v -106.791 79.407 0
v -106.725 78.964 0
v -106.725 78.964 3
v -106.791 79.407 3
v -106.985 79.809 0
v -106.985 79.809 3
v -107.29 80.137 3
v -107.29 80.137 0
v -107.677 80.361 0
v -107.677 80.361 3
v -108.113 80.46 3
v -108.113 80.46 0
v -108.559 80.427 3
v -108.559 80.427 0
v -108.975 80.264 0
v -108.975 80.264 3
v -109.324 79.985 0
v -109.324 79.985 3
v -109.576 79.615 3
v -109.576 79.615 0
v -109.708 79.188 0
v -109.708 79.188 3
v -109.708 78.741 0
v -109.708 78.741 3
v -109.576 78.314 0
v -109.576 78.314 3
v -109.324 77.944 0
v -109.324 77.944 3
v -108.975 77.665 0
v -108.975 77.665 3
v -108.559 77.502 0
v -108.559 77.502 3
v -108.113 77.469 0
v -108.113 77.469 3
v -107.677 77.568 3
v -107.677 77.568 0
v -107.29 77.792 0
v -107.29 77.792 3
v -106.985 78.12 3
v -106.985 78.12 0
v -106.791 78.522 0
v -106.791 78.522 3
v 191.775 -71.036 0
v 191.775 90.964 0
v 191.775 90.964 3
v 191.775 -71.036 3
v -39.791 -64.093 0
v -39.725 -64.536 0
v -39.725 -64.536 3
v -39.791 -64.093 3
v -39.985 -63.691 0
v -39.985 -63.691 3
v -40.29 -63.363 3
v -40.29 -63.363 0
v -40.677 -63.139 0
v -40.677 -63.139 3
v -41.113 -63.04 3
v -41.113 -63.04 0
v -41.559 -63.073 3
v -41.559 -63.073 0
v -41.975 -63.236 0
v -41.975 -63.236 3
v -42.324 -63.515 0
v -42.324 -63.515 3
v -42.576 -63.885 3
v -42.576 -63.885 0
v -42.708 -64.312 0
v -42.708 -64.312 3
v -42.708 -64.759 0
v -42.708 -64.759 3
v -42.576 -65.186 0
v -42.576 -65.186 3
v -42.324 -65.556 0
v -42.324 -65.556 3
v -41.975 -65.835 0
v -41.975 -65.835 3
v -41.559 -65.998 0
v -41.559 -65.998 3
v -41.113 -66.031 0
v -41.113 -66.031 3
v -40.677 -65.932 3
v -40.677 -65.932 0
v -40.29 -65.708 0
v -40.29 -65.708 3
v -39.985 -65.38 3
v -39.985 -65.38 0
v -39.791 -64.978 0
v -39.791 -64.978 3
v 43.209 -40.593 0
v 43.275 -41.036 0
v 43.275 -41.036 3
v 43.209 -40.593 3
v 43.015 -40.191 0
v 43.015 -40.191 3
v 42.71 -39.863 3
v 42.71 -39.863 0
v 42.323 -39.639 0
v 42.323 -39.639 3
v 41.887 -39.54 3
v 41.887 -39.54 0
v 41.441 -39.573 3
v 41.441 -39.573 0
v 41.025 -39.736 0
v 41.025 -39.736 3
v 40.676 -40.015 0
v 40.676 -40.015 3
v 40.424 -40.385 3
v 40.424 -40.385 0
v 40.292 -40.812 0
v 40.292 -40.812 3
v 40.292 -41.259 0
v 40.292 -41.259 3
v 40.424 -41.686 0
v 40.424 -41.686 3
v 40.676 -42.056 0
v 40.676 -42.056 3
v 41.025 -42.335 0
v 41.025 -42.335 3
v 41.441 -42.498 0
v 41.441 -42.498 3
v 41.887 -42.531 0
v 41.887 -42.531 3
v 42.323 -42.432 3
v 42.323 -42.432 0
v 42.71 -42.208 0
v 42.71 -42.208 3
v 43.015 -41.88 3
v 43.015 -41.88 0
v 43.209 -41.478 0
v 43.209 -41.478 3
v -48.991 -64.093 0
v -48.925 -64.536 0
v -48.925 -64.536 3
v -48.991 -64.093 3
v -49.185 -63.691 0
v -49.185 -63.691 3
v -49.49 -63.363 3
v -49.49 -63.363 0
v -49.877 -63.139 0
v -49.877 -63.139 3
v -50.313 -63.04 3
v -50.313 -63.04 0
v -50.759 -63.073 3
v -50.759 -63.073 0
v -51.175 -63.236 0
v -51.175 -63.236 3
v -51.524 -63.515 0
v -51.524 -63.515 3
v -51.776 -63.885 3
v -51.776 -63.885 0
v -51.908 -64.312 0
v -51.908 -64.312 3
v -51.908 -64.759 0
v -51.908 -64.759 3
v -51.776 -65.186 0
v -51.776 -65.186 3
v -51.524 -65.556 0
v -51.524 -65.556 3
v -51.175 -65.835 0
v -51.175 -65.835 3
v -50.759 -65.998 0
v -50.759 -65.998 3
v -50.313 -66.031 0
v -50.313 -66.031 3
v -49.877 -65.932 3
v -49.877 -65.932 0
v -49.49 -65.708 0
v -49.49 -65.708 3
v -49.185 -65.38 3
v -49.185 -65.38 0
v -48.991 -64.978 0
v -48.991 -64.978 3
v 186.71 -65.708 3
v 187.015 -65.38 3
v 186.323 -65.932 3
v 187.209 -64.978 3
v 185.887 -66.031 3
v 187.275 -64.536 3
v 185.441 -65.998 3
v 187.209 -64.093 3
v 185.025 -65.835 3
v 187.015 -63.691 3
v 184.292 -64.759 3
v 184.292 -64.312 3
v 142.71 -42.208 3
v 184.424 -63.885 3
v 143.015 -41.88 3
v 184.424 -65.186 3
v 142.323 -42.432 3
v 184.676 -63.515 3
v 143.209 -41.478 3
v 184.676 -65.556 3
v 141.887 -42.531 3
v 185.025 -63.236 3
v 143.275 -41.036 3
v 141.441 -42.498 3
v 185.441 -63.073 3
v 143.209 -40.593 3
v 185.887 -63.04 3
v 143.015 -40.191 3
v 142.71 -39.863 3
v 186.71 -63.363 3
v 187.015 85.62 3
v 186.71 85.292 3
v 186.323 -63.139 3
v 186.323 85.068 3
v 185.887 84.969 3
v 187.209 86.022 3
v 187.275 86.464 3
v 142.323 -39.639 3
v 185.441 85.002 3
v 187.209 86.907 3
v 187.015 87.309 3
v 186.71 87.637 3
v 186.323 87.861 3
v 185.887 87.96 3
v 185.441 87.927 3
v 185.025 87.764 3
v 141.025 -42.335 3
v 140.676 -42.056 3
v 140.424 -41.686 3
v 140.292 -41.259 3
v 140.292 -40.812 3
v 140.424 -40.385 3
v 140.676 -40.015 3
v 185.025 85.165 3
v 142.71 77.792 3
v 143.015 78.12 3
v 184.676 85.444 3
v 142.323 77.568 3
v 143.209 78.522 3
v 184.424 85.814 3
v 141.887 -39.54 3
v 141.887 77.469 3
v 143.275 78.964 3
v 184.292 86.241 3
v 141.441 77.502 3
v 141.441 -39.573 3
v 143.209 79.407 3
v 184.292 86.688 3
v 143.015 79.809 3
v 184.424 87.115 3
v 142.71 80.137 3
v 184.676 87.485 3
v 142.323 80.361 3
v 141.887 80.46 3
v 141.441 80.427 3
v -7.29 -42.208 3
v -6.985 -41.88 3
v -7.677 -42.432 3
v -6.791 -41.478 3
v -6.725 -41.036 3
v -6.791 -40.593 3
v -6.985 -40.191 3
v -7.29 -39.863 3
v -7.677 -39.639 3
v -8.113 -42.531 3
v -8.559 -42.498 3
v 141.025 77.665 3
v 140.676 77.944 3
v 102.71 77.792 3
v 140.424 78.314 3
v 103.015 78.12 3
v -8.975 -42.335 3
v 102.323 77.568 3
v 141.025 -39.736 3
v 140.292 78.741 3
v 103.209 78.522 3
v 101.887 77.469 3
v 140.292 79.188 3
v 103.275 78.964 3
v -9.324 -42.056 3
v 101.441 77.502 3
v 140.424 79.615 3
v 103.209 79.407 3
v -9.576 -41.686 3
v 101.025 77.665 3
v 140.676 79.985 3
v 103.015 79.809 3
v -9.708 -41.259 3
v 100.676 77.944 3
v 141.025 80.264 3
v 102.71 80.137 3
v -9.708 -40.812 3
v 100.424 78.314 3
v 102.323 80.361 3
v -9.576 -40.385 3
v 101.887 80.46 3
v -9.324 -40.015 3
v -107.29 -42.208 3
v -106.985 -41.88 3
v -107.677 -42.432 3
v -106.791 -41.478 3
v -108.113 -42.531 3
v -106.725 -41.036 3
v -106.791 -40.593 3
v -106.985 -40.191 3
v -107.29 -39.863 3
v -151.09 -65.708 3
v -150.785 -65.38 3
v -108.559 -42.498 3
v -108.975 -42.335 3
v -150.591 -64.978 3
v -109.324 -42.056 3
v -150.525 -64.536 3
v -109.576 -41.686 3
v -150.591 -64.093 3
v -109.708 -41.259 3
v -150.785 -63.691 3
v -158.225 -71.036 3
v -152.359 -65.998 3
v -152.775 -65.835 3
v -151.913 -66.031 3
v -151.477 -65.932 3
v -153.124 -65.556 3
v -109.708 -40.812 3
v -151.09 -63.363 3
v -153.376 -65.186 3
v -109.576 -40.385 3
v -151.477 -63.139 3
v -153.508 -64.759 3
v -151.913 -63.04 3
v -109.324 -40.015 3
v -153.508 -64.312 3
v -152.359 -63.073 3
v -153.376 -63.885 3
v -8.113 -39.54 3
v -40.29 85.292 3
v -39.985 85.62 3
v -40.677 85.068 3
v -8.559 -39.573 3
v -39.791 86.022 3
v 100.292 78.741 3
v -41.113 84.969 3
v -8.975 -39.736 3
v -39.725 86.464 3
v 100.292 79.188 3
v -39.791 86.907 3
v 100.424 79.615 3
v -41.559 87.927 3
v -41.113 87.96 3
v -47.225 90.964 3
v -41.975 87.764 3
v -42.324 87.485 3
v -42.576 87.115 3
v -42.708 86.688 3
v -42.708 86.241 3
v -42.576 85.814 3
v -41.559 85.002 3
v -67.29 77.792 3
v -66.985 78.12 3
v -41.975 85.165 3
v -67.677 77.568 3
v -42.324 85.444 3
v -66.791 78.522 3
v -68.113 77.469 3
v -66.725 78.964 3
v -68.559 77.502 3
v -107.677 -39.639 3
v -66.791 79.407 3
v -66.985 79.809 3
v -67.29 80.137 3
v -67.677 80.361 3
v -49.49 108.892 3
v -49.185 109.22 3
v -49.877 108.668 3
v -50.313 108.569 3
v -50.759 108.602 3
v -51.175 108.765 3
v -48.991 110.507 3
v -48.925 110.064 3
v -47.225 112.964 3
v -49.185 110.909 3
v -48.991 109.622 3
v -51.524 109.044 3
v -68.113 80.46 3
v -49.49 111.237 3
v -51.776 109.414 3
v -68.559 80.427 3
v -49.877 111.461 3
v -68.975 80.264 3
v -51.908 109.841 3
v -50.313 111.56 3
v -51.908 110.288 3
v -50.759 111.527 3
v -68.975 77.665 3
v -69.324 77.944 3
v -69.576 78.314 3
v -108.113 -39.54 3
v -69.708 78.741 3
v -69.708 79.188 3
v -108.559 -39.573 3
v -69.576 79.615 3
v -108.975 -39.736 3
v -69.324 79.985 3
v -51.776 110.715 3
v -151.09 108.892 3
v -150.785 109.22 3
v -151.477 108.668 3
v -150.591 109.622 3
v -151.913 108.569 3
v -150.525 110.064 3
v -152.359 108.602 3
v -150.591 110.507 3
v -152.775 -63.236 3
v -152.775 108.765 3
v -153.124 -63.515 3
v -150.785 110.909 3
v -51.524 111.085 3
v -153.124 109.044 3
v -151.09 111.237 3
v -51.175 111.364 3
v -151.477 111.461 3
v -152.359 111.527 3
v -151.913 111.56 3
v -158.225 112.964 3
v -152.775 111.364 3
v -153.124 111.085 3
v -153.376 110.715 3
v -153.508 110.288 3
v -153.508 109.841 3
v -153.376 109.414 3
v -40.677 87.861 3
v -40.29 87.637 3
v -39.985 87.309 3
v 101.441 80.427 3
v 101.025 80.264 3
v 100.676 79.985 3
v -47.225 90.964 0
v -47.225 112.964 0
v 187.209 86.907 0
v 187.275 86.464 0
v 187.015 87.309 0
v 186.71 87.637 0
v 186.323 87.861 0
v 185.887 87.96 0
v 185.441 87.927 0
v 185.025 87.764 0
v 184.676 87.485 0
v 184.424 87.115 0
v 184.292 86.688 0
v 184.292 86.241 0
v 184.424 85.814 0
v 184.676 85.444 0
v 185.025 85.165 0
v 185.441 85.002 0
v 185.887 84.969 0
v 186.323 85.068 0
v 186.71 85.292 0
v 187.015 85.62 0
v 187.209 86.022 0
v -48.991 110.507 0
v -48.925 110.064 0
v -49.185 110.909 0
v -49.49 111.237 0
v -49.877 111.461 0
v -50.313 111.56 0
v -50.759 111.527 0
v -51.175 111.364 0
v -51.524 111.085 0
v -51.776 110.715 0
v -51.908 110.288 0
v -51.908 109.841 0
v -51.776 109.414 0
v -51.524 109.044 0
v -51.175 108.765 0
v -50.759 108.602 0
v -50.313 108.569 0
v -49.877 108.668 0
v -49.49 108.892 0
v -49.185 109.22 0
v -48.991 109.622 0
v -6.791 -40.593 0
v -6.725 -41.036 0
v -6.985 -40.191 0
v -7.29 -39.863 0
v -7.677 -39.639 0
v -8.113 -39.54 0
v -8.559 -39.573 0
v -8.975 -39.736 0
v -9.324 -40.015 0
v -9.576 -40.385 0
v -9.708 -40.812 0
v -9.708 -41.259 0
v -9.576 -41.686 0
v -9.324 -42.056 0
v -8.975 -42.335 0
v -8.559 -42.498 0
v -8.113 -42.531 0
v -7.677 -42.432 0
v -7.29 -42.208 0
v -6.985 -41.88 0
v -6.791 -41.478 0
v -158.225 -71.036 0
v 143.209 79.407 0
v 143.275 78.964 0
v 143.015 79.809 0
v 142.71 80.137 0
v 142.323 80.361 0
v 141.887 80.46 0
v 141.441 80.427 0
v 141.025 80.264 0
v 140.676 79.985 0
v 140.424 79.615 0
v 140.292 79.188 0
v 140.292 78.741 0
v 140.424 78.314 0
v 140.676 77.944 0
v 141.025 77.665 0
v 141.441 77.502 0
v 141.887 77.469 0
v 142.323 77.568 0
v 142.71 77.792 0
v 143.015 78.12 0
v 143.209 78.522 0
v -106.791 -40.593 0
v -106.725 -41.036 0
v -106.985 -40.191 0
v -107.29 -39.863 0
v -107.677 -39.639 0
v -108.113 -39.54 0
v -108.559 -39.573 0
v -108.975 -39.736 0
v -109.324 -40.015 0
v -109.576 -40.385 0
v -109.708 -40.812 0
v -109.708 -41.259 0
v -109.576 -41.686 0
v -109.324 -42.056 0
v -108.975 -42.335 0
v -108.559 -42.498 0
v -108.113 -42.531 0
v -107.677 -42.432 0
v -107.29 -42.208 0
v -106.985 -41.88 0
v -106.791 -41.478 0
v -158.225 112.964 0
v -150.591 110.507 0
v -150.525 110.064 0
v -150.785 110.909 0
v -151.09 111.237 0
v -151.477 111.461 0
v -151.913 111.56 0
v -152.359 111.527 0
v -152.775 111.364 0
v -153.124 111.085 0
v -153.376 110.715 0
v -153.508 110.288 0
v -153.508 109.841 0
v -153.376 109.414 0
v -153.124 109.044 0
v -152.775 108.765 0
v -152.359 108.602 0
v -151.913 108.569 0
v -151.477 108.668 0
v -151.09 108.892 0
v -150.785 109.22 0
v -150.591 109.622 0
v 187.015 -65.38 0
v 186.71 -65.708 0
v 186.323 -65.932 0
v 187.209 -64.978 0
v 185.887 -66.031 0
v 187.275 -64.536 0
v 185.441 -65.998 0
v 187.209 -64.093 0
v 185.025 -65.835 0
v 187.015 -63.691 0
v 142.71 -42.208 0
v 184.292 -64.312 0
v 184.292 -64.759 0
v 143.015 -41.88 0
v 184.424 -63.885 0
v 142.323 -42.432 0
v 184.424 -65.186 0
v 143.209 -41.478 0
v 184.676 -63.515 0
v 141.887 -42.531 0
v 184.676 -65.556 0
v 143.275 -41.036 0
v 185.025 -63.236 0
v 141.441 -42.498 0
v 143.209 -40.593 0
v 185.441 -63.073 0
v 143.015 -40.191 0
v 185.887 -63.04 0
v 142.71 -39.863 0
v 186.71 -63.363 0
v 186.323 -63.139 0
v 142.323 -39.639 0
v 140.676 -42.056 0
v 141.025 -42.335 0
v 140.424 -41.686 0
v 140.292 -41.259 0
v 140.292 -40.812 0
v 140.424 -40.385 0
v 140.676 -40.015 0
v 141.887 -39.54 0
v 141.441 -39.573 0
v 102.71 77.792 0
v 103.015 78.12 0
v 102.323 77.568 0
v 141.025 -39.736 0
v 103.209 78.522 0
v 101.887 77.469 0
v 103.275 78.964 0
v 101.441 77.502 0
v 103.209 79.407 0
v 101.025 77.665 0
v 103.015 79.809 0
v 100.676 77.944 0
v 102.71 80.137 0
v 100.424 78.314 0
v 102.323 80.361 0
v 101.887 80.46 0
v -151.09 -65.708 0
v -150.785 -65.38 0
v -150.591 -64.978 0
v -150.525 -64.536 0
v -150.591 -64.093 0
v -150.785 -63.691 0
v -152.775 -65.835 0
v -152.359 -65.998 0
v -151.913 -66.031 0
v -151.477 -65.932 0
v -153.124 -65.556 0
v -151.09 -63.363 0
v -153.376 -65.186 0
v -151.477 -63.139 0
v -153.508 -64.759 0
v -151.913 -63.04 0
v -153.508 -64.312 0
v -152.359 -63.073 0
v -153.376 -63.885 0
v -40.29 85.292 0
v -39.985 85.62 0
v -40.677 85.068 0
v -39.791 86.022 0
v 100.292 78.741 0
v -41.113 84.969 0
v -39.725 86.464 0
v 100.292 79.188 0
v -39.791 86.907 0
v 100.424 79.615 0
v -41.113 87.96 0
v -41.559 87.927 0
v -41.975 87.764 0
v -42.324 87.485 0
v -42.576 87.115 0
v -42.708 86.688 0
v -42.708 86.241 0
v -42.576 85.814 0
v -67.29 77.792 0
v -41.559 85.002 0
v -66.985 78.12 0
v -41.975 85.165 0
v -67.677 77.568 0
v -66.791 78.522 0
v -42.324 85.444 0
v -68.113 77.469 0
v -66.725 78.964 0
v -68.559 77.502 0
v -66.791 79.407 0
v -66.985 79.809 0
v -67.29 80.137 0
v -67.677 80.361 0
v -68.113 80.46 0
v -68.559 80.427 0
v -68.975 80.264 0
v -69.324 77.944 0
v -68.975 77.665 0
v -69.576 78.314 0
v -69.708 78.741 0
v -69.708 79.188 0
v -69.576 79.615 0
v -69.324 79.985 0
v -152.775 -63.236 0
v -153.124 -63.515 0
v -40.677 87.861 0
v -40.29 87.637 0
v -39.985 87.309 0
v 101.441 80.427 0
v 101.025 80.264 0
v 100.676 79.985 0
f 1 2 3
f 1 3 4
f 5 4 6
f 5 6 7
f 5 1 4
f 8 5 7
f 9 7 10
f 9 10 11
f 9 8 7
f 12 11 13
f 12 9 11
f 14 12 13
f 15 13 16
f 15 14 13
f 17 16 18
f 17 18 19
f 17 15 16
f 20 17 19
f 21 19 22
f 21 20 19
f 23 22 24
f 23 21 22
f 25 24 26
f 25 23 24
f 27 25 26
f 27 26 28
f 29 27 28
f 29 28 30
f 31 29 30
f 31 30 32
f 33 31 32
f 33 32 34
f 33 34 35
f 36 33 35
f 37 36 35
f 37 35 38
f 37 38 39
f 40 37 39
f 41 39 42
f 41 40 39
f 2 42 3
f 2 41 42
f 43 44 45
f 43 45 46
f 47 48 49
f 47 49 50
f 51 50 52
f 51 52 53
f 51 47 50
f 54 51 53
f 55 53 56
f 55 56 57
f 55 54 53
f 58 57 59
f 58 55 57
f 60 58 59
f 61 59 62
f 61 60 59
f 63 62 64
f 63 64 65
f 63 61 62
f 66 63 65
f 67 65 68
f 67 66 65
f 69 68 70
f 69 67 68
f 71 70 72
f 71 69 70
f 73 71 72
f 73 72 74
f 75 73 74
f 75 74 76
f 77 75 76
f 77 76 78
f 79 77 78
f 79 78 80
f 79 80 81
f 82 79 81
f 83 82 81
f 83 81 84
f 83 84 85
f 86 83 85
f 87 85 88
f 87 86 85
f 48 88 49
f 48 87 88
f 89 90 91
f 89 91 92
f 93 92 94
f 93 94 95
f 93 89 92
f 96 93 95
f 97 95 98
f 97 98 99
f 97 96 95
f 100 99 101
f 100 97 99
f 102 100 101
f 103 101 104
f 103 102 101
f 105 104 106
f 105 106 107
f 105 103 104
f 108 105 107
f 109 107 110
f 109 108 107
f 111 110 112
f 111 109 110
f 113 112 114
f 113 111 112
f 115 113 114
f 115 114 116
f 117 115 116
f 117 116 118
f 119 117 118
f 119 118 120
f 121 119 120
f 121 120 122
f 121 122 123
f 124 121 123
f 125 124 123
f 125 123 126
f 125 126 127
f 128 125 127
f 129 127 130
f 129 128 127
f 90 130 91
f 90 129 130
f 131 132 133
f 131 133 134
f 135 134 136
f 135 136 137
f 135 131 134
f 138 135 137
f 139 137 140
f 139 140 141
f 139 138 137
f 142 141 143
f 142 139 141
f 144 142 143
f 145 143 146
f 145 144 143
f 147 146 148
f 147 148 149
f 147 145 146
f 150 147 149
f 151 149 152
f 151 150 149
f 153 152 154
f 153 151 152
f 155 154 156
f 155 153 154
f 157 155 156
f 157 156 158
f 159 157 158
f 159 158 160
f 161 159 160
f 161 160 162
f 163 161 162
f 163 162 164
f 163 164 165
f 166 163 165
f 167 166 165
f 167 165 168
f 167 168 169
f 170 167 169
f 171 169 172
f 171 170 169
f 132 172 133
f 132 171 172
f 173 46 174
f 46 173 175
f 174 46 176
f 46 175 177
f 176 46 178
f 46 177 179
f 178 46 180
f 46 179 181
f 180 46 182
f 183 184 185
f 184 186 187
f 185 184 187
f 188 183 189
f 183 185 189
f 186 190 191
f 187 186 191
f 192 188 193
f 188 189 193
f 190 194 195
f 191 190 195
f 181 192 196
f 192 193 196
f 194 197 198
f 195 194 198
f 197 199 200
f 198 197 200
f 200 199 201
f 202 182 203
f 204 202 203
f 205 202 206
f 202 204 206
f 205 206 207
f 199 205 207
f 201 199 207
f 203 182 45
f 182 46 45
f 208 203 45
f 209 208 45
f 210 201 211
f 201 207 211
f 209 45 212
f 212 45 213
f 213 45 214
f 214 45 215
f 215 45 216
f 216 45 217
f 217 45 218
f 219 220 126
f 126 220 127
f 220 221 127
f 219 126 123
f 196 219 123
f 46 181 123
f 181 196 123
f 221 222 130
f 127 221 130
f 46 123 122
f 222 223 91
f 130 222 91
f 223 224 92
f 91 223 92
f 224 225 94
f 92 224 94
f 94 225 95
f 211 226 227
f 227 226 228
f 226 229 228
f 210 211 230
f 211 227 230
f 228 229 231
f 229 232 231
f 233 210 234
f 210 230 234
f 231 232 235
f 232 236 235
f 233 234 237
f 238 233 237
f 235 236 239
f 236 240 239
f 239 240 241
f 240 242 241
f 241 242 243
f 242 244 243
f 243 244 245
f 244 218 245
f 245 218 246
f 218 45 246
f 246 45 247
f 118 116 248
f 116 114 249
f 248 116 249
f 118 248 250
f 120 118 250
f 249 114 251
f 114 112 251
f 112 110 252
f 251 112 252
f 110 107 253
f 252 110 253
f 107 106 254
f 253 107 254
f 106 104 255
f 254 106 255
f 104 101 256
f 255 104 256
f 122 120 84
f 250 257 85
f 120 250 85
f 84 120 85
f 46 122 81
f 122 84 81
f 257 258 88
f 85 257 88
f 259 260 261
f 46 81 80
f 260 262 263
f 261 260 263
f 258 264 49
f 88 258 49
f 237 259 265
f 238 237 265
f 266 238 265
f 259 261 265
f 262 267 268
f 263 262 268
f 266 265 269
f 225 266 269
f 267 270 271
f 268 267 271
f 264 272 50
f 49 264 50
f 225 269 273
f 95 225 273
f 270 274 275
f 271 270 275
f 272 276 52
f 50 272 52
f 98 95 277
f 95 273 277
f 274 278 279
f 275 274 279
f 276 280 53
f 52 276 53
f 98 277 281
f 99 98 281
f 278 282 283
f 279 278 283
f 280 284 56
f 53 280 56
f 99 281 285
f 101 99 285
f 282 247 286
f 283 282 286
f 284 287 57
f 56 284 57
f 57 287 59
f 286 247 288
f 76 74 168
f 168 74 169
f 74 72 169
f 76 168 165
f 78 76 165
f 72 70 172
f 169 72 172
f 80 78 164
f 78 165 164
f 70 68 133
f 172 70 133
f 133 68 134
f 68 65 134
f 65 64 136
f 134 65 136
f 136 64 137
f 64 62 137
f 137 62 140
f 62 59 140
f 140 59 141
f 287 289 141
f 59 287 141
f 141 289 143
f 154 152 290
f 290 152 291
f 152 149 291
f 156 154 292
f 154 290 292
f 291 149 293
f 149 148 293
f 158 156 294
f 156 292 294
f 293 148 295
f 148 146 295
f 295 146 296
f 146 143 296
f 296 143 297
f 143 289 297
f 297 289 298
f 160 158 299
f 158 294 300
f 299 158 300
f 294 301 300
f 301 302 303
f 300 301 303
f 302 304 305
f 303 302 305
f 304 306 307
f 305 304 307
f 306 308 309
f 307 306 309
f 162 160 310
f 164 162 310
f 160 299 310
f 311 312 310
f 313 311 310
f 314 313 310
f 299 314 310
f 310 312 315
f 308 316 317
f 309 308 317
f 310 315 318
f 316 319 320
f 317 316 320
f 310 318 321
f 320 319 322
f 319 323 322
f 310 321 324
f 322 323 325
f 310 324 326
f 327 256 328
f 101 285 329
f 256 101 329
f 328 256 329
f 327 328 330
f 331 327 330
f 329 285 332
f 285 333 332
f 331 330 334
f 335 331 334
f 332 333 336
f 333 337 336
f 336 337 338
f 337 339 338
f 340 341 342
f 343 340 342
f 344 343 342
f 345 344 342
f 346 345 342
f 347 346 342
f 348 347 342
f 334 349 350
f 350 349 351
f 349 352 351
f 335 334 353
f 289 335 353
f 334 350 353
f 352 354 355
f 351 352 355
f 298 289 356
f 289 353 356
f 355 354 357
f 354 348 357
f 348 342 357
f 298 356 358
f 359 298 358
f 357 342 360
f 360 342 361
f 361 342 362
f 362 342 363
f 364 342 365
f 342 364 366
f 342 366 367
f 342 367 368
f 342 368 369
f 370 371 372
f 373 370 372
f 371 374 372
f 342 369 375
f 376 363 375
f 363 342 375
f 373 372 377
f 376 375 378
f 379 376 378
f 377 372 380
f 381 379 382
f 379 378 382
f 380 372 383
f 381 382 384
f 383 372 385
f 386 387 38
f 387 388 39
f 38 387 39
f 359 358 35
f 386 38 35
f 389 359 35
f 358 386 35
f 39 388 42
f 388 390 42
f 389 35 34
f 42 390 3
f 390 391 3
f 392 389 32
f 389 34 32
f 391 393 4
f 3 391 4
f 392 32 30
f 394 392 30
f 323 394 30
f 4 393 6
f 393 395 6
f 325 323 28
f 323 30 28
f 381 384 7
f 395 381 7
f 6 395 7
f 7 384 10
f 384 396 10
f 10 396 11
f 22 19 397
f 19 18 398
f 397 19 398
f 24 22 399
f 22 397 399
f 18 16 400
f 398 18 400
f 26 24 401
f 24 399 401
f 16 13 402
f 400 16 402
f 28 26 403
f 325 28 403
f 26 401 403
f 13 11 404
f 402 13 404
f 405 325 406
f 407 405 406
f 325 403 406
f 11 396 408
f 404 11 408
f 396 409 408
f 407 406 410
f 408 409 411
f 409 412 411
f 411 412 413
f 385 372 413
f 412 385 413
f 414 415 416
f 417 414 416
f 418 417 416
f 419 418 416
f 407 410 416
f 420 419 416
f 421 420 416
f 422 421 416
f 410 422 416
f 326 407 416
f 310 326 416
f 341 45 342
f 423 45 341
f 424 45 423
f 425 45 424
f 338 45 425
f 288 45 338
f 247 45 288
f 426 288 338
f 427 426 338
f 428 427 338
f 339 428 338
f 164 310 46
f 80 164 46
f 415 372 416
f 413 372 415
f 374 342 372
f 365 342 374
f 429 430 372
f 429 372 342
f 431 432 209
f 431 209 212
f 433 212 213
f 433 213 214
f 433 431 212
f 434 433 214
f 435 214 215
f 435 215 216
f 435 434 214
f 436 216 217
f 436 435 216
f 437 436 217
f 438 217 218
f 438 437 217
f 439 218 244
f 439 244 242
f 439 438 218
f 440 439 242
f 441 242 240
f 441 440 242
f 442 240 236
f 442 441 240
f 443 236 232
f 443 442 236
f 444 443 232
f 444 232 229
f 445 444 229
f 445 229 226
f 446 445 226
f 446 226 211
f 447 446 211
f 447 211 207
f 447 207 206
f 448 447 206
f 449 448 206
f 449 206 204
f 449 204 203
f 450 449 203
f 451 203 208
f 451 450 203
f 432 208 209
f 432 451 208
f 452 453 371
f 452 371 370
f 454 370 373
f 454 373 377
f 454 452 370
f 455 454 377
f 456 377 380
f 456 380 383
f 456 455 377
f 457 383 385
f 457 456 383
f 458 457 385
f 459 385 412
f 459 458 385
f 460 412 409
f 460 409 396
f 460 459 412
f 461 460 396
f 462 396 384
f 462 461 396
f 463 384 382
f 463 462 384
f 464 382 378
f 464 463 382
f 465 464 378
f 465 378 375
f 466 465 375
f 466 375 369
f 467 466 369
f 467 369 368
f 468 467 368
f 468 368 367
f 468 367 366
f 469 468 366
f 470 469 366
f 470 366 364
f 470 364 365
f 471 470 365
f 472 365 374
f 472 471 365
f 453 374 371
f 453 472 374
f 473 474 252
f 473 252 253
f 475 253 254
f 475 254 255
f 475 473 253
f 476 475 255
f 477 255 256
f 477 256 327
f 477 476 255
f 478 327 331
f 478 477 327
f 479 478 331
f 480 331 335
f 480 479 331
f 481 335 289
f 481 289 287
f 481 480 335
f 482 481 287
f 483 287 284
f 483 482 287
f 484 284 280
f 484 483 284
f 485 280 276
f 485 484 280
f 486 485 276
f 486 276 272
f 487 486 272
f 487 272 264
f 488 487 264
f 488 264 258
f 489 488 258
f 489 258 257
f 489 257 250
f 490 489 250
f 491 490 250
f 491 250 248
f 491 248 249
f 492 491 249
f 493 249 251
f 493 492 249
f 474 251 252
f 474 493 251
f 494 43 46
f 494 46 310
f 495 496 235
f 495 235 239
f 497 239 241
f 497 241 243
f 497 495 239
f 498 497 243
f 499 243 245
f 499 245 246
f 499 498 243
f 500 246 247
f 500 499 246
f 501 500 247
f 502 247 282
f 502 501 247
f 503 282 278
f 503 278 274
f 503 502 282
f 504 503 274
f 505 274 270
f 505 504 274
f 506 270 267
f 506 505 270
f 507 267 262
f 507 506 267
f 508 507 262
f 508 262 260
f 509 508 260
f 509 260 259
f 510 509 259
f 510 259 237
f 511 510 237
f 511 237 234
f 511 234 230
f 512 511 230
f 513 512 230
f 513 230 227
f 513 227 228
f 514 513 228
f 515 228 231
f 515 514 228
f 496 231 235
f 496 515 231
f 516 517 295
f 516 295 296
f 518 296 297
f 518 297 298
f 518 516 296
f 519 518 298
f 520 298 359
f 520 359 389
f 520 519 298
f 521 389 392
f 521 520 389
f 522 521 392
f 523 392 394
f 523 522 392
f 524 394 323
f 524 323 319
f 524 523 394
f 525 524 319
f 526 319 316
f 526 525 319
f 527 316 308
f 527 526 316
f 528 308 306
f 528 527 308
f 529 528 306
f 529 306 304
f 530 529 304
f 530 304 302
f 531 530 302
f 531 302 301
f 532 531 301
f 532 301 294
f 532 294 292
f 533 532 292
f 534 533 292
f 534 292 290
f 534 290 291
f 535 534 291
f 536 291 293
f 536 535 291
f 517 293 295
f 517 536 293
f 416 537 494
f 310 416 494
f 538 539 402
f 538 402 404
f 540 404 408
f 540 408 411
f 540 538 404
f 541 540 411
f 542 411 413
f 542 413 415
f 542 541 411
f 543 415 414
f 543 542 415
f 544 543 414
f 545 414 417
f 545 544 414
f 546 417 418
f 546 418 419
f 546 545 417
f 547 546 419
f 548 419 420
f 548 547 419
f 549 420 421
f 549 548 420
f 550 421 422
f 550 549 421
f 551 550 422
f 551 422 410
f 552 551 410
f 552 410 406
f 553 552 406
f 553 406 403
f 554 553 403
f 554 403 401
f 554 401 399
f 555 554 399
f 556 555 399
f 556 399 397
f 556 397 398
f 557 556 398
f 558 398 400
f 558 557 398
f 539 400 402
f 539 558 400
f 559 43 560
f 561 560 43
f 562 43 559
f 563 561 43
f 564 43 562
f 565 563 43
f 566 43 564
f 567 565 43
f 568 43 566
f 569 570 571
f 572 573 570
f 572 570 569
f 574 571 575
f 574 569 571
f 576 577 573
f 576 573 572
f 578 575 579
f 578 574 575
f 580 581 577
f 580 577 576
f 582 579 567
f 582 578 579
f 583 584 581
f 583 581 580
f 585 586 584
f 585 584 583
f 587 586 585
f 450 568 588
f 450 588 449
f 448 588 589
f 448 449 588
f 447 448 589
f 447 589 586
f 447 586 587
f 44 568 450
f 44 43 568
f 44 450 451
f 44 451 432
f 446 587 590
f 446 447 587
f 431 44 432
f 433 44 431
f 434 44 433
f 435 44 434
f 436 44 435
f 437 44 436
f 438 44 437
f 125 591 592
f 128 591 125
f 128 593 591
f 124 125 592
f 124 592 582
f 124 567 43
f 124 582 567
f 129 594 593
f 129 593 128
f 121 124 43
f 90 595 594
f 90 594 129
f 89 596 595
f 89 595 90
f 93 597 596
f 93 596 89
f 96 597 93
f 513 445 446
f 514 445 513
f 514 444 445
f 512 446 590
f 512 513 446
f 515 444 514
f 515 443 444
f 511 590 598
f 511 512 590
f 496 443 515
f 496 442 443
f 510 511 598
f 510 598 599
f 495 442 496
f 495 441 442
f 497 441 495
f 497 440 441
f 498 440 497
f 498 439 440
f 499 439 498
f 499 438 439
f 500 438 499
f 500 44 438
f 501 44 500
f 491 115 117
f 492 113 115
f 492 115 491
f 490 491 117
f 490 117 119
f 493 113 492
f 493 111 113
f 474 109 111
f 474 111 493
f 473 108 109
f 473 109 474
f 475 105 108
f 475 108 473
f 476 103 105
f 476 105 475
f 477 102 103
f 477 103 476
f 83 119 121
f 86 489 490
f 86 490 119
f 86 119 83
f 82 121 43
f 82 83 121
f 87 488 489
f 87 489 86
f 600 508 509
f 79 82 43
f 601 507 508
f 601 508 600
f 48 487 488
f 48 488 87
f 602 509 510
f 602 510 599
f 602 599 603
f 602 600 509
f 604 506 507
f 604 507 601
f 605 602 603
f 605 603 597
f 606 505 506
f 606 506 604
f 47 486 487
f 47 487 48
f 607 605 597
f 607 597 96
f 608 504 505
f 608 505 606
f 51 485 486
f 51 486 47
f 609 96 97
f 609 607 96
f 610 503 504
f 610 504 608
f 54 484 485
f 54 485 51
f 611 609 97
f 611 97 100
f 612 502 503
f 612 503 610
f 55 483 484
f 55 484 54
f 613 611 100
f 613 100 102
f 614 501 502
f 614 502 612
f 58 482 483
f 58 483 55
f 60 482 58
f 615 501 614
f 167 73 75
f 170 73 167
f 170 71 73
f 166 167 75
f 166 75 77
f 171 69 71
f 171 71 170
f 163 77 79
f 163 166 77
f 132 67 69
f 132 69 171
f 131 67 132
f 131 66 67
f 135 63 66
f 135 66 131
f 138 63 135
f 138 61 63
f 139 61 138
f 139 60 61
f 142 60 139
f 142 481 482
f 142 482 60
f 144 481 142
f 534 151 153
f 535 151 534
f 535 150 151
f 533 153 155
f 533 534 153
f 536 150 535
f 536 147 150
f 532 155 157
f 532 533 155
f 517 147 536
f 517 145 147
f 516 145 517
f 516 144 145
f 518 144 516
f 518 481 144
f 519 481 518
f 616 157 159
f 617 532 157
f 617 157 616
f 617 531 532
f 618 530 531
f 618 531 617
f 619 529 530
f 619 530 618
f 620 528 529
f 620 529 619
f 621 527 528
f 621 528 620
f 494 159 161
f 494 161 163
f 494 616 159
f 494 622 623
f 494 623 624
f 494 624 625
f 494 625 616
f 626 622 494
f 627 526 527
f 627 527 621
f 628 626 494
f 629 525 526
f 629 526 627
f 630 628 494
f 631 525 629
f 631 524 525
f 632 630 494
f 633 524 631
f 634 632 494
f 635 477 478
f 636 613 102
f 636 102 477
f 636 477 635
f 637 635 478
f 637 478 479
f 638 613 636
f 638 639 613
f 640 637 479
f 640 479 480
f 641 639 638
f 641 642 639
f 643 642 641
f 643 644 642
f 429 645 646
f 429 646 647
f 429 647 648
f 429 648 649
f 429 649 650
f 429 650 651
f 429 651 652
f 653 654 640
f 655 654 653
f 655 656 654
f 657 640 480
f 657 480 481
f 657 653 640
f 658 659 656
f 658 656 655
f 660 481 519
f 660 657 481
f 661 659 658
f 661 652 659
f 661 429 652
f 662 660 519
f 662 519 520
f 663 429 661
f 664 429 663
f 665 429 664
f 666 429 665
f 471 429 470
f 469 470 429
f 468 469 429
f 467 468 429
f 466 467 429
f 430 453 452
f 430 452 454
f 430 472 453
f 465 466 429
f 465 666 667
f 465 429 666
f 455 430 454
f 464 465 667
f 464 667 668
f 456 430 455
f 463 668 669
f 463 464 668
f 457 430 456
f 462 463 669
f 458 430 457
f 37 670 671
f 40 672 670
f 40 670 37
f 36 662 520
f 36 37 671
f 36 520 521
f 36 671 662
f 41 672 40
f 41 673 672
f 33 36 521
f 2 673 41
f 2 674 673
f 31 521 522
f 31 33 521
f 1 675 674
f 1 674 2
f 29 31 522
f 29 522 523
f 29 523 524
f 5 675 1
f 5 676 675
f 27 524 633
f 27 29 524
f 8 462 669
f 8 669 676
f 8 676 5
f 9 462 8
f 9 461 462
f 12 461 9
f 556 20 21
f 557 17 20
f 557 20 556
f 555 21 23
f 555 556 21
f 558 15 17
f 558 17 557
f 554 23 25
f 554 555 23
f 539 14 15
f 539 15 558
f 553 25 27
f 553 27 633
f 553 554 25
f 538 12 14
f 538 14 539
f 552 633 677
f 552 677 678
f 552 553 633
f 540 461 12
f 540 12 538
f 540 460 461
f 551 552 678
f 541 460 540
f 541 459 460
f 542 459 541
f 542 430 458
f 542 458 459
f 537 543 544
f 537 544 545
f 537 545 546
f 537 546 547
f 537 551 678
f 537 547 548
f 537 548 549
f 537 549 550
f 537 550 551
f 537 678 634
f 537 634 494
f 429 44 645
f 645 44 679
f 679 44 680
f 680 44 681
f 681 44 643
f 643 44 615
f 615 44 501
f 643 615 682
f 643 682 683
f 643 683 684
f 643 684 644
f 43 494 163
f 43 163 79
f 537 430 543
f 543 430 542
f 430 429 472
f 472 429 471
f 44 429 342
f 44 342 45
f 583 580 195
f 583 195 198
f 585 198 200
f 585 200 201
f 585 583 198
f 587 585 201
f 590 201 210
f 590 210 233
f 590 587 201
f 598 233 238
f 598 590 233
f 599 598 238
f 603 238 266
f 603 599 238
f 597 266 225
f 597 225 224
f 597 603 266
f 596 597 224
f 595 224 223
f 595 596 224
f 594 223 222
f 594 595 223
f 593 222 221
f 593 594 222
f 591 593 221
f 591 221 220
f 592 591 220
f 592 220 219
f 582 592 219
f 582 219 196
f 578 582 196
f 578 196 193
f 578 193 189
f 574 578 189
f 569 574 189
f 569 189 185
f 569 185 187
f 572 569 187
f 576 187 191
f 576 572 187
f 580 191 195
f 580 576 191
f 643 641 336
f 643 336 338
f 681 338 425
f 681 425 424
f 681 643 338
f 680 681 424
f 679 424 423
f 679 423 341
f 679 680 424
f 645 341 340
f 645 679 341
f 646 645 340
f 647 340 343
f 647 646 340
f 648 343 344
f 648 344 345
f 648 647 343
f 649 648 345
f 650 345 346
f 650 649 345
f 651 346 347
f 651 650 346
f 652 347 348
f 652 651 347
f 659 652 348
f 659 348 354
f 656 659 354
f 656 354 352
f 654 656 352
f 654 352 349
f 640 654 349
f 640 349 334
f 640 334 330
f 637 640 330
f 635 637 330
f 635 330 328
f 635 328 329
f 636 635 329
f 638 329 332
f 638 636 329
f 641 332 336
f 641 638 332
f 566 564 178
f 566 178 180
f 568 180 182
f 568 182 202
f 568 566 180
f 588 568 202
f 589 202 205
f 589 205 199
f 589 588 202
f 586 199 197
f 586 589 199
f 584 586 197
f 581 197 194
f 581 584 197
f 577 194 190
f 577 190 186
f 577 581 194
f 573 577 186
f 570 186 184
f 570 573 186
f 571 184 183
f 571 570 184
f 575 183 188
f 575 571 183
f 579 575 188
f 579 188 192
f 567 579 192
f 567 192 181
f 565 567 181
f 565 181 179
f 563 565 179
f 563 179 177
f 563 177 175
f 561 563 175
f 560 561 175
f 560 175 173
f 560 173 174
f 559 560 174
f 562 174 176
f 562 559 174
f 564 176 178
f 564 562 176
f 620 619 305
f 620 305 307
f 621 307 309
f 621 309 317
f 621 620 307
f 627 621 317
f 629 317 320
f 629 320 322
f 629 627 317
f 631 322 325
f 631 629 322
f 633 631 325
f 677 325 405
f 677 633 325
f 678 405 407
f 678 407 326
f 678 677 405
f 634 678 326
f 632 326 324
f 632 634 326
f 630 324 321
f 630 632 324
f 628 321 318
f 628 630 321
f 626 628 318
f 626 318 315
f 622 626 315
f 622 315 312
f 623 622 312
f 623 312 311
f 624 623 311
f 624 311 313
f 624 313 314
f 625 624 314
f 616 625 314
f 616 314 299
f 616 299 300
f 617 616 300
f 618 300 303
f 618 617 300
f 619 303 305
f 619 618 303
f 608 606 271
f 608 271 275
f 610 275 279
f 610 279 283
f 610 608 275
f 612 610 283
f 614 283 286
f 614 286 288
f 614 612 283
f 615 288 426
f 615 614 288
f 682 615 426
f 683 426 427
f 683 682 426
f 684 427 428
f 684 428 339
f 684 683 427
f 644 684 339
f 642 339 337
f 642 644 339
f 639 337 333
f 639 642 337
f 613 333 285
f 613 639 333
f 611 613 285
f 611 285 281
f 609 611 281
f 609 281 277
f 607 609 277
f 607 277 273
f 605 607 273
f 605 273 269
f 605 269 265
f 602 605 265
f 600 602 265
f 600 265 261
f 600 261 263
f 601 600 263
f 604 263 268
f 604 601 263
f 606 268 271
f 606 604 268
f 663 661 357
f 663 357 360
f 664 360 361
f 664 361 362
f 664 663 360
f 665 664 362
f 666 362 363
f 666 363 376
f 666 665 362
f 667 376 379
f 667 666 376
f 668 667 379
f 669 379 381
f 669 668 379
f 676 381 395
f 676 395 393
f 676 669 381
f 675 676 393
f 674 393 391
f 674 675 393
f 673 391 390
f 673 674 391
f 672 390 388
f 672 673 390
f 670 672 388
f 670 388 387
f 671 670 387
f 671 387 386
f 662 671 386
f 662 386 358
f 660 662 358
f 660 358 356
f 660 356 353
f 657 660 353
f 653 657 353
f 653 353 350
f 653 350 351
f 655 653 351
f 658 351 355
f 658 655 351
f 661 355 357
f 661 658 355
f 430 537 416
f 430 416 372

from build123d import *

# Parameters (mm, degrees)
SKETCH_1_R      = 1.5
EXTRUDE_1_DEPTH = 3


with BuildPart() as part:
    # 스케치1 → 보스-돌출1 (new body)
    with BuildSketch(Plane.XY):
        Polygon((-47.224852071, 90.964497041), (191.775147929, 90.964497041), (191.775147929, -71.035502959), (-158.224852071, -71.035502959), (-158.224852071, 90.964497041), (-158.224852071, 112.964497041), (-47.224852071, 112.964497041), align=None)
        with Locations((-108.224852071, 78.964497041)):
            Circle(SKETCH_1_R, mode=Mode.SUBTRACT)
        with Locations((-68.224852071, 78.964497041)):
            Circle(SKETCH_1_R, mode=Mode.SUBTRACT)
        with Locations((101.775147929, 78.964497041)):
            Circle(SKETCH_1_R, mode=Mode.SUBTRACT)
        with Locations((141.775147929, 78.964497041)):
            Circle(SKETCH_1_R, mode=Mode.SUBTRACT)
        with Locations((141.775147929, -41.035502959)):
            Circle(SKETCH_1_R, mode=Mode.SUBTRACT)
        with Locations((41.775147929, -41.035502959)):
            Circle(SKETCH_1_R, mode=Mode.SUBTRACT)
        with Locations((-8.224852071, -41.035502959)):
            Circle(SKETCH_1_R, mode=Mode.SUBTRACT)
        with Locations((-108.224852071, -41.035502959)):
            Circle(SKETCH_1_R, mode=Mode.SUBTRACT)
        with Locations((-152.024852071, 110.064497041)):
            Circle(SKETCH_1_R, mode=Mode.SUBTRACT)
        with Locations((-50.424852071, 110.064497041)):
            Circle(SKETCH_1_R, mode=Mode.SUBTRACT)
        with Locations((-41.224852071, 86.464497041)):
            Circle(SKETCH_1_R, mode=Mode.SUBTRACT)
        with Locations((185.775147929, 86.464497041)):
            Circle(SKETCH_1_R, mode=Mode.SUBTRACT)
        with Locations((185.775147929, -64.535502959)):
            Circle(SKETCH_1_R, mode=Mode.SUBTRACT)
        with Locations((-41.224852071, -64.535502959)):
            Circle(SKETCH_1_R, mode=Mode.SUBTRACT)
        with Locations((-50.424852071, -64.535502959)):
            Circle(SKETCH_1_R, mode=Mode.SUBTRACT)
        with Locations((-152.024852071, -64.535502959)):
            Circle(SKETCH_1_R, mode=Mode.SUBTRACT)
    extrude(amount=EXTRUDE_1_DEPTH)


solid = part.part
